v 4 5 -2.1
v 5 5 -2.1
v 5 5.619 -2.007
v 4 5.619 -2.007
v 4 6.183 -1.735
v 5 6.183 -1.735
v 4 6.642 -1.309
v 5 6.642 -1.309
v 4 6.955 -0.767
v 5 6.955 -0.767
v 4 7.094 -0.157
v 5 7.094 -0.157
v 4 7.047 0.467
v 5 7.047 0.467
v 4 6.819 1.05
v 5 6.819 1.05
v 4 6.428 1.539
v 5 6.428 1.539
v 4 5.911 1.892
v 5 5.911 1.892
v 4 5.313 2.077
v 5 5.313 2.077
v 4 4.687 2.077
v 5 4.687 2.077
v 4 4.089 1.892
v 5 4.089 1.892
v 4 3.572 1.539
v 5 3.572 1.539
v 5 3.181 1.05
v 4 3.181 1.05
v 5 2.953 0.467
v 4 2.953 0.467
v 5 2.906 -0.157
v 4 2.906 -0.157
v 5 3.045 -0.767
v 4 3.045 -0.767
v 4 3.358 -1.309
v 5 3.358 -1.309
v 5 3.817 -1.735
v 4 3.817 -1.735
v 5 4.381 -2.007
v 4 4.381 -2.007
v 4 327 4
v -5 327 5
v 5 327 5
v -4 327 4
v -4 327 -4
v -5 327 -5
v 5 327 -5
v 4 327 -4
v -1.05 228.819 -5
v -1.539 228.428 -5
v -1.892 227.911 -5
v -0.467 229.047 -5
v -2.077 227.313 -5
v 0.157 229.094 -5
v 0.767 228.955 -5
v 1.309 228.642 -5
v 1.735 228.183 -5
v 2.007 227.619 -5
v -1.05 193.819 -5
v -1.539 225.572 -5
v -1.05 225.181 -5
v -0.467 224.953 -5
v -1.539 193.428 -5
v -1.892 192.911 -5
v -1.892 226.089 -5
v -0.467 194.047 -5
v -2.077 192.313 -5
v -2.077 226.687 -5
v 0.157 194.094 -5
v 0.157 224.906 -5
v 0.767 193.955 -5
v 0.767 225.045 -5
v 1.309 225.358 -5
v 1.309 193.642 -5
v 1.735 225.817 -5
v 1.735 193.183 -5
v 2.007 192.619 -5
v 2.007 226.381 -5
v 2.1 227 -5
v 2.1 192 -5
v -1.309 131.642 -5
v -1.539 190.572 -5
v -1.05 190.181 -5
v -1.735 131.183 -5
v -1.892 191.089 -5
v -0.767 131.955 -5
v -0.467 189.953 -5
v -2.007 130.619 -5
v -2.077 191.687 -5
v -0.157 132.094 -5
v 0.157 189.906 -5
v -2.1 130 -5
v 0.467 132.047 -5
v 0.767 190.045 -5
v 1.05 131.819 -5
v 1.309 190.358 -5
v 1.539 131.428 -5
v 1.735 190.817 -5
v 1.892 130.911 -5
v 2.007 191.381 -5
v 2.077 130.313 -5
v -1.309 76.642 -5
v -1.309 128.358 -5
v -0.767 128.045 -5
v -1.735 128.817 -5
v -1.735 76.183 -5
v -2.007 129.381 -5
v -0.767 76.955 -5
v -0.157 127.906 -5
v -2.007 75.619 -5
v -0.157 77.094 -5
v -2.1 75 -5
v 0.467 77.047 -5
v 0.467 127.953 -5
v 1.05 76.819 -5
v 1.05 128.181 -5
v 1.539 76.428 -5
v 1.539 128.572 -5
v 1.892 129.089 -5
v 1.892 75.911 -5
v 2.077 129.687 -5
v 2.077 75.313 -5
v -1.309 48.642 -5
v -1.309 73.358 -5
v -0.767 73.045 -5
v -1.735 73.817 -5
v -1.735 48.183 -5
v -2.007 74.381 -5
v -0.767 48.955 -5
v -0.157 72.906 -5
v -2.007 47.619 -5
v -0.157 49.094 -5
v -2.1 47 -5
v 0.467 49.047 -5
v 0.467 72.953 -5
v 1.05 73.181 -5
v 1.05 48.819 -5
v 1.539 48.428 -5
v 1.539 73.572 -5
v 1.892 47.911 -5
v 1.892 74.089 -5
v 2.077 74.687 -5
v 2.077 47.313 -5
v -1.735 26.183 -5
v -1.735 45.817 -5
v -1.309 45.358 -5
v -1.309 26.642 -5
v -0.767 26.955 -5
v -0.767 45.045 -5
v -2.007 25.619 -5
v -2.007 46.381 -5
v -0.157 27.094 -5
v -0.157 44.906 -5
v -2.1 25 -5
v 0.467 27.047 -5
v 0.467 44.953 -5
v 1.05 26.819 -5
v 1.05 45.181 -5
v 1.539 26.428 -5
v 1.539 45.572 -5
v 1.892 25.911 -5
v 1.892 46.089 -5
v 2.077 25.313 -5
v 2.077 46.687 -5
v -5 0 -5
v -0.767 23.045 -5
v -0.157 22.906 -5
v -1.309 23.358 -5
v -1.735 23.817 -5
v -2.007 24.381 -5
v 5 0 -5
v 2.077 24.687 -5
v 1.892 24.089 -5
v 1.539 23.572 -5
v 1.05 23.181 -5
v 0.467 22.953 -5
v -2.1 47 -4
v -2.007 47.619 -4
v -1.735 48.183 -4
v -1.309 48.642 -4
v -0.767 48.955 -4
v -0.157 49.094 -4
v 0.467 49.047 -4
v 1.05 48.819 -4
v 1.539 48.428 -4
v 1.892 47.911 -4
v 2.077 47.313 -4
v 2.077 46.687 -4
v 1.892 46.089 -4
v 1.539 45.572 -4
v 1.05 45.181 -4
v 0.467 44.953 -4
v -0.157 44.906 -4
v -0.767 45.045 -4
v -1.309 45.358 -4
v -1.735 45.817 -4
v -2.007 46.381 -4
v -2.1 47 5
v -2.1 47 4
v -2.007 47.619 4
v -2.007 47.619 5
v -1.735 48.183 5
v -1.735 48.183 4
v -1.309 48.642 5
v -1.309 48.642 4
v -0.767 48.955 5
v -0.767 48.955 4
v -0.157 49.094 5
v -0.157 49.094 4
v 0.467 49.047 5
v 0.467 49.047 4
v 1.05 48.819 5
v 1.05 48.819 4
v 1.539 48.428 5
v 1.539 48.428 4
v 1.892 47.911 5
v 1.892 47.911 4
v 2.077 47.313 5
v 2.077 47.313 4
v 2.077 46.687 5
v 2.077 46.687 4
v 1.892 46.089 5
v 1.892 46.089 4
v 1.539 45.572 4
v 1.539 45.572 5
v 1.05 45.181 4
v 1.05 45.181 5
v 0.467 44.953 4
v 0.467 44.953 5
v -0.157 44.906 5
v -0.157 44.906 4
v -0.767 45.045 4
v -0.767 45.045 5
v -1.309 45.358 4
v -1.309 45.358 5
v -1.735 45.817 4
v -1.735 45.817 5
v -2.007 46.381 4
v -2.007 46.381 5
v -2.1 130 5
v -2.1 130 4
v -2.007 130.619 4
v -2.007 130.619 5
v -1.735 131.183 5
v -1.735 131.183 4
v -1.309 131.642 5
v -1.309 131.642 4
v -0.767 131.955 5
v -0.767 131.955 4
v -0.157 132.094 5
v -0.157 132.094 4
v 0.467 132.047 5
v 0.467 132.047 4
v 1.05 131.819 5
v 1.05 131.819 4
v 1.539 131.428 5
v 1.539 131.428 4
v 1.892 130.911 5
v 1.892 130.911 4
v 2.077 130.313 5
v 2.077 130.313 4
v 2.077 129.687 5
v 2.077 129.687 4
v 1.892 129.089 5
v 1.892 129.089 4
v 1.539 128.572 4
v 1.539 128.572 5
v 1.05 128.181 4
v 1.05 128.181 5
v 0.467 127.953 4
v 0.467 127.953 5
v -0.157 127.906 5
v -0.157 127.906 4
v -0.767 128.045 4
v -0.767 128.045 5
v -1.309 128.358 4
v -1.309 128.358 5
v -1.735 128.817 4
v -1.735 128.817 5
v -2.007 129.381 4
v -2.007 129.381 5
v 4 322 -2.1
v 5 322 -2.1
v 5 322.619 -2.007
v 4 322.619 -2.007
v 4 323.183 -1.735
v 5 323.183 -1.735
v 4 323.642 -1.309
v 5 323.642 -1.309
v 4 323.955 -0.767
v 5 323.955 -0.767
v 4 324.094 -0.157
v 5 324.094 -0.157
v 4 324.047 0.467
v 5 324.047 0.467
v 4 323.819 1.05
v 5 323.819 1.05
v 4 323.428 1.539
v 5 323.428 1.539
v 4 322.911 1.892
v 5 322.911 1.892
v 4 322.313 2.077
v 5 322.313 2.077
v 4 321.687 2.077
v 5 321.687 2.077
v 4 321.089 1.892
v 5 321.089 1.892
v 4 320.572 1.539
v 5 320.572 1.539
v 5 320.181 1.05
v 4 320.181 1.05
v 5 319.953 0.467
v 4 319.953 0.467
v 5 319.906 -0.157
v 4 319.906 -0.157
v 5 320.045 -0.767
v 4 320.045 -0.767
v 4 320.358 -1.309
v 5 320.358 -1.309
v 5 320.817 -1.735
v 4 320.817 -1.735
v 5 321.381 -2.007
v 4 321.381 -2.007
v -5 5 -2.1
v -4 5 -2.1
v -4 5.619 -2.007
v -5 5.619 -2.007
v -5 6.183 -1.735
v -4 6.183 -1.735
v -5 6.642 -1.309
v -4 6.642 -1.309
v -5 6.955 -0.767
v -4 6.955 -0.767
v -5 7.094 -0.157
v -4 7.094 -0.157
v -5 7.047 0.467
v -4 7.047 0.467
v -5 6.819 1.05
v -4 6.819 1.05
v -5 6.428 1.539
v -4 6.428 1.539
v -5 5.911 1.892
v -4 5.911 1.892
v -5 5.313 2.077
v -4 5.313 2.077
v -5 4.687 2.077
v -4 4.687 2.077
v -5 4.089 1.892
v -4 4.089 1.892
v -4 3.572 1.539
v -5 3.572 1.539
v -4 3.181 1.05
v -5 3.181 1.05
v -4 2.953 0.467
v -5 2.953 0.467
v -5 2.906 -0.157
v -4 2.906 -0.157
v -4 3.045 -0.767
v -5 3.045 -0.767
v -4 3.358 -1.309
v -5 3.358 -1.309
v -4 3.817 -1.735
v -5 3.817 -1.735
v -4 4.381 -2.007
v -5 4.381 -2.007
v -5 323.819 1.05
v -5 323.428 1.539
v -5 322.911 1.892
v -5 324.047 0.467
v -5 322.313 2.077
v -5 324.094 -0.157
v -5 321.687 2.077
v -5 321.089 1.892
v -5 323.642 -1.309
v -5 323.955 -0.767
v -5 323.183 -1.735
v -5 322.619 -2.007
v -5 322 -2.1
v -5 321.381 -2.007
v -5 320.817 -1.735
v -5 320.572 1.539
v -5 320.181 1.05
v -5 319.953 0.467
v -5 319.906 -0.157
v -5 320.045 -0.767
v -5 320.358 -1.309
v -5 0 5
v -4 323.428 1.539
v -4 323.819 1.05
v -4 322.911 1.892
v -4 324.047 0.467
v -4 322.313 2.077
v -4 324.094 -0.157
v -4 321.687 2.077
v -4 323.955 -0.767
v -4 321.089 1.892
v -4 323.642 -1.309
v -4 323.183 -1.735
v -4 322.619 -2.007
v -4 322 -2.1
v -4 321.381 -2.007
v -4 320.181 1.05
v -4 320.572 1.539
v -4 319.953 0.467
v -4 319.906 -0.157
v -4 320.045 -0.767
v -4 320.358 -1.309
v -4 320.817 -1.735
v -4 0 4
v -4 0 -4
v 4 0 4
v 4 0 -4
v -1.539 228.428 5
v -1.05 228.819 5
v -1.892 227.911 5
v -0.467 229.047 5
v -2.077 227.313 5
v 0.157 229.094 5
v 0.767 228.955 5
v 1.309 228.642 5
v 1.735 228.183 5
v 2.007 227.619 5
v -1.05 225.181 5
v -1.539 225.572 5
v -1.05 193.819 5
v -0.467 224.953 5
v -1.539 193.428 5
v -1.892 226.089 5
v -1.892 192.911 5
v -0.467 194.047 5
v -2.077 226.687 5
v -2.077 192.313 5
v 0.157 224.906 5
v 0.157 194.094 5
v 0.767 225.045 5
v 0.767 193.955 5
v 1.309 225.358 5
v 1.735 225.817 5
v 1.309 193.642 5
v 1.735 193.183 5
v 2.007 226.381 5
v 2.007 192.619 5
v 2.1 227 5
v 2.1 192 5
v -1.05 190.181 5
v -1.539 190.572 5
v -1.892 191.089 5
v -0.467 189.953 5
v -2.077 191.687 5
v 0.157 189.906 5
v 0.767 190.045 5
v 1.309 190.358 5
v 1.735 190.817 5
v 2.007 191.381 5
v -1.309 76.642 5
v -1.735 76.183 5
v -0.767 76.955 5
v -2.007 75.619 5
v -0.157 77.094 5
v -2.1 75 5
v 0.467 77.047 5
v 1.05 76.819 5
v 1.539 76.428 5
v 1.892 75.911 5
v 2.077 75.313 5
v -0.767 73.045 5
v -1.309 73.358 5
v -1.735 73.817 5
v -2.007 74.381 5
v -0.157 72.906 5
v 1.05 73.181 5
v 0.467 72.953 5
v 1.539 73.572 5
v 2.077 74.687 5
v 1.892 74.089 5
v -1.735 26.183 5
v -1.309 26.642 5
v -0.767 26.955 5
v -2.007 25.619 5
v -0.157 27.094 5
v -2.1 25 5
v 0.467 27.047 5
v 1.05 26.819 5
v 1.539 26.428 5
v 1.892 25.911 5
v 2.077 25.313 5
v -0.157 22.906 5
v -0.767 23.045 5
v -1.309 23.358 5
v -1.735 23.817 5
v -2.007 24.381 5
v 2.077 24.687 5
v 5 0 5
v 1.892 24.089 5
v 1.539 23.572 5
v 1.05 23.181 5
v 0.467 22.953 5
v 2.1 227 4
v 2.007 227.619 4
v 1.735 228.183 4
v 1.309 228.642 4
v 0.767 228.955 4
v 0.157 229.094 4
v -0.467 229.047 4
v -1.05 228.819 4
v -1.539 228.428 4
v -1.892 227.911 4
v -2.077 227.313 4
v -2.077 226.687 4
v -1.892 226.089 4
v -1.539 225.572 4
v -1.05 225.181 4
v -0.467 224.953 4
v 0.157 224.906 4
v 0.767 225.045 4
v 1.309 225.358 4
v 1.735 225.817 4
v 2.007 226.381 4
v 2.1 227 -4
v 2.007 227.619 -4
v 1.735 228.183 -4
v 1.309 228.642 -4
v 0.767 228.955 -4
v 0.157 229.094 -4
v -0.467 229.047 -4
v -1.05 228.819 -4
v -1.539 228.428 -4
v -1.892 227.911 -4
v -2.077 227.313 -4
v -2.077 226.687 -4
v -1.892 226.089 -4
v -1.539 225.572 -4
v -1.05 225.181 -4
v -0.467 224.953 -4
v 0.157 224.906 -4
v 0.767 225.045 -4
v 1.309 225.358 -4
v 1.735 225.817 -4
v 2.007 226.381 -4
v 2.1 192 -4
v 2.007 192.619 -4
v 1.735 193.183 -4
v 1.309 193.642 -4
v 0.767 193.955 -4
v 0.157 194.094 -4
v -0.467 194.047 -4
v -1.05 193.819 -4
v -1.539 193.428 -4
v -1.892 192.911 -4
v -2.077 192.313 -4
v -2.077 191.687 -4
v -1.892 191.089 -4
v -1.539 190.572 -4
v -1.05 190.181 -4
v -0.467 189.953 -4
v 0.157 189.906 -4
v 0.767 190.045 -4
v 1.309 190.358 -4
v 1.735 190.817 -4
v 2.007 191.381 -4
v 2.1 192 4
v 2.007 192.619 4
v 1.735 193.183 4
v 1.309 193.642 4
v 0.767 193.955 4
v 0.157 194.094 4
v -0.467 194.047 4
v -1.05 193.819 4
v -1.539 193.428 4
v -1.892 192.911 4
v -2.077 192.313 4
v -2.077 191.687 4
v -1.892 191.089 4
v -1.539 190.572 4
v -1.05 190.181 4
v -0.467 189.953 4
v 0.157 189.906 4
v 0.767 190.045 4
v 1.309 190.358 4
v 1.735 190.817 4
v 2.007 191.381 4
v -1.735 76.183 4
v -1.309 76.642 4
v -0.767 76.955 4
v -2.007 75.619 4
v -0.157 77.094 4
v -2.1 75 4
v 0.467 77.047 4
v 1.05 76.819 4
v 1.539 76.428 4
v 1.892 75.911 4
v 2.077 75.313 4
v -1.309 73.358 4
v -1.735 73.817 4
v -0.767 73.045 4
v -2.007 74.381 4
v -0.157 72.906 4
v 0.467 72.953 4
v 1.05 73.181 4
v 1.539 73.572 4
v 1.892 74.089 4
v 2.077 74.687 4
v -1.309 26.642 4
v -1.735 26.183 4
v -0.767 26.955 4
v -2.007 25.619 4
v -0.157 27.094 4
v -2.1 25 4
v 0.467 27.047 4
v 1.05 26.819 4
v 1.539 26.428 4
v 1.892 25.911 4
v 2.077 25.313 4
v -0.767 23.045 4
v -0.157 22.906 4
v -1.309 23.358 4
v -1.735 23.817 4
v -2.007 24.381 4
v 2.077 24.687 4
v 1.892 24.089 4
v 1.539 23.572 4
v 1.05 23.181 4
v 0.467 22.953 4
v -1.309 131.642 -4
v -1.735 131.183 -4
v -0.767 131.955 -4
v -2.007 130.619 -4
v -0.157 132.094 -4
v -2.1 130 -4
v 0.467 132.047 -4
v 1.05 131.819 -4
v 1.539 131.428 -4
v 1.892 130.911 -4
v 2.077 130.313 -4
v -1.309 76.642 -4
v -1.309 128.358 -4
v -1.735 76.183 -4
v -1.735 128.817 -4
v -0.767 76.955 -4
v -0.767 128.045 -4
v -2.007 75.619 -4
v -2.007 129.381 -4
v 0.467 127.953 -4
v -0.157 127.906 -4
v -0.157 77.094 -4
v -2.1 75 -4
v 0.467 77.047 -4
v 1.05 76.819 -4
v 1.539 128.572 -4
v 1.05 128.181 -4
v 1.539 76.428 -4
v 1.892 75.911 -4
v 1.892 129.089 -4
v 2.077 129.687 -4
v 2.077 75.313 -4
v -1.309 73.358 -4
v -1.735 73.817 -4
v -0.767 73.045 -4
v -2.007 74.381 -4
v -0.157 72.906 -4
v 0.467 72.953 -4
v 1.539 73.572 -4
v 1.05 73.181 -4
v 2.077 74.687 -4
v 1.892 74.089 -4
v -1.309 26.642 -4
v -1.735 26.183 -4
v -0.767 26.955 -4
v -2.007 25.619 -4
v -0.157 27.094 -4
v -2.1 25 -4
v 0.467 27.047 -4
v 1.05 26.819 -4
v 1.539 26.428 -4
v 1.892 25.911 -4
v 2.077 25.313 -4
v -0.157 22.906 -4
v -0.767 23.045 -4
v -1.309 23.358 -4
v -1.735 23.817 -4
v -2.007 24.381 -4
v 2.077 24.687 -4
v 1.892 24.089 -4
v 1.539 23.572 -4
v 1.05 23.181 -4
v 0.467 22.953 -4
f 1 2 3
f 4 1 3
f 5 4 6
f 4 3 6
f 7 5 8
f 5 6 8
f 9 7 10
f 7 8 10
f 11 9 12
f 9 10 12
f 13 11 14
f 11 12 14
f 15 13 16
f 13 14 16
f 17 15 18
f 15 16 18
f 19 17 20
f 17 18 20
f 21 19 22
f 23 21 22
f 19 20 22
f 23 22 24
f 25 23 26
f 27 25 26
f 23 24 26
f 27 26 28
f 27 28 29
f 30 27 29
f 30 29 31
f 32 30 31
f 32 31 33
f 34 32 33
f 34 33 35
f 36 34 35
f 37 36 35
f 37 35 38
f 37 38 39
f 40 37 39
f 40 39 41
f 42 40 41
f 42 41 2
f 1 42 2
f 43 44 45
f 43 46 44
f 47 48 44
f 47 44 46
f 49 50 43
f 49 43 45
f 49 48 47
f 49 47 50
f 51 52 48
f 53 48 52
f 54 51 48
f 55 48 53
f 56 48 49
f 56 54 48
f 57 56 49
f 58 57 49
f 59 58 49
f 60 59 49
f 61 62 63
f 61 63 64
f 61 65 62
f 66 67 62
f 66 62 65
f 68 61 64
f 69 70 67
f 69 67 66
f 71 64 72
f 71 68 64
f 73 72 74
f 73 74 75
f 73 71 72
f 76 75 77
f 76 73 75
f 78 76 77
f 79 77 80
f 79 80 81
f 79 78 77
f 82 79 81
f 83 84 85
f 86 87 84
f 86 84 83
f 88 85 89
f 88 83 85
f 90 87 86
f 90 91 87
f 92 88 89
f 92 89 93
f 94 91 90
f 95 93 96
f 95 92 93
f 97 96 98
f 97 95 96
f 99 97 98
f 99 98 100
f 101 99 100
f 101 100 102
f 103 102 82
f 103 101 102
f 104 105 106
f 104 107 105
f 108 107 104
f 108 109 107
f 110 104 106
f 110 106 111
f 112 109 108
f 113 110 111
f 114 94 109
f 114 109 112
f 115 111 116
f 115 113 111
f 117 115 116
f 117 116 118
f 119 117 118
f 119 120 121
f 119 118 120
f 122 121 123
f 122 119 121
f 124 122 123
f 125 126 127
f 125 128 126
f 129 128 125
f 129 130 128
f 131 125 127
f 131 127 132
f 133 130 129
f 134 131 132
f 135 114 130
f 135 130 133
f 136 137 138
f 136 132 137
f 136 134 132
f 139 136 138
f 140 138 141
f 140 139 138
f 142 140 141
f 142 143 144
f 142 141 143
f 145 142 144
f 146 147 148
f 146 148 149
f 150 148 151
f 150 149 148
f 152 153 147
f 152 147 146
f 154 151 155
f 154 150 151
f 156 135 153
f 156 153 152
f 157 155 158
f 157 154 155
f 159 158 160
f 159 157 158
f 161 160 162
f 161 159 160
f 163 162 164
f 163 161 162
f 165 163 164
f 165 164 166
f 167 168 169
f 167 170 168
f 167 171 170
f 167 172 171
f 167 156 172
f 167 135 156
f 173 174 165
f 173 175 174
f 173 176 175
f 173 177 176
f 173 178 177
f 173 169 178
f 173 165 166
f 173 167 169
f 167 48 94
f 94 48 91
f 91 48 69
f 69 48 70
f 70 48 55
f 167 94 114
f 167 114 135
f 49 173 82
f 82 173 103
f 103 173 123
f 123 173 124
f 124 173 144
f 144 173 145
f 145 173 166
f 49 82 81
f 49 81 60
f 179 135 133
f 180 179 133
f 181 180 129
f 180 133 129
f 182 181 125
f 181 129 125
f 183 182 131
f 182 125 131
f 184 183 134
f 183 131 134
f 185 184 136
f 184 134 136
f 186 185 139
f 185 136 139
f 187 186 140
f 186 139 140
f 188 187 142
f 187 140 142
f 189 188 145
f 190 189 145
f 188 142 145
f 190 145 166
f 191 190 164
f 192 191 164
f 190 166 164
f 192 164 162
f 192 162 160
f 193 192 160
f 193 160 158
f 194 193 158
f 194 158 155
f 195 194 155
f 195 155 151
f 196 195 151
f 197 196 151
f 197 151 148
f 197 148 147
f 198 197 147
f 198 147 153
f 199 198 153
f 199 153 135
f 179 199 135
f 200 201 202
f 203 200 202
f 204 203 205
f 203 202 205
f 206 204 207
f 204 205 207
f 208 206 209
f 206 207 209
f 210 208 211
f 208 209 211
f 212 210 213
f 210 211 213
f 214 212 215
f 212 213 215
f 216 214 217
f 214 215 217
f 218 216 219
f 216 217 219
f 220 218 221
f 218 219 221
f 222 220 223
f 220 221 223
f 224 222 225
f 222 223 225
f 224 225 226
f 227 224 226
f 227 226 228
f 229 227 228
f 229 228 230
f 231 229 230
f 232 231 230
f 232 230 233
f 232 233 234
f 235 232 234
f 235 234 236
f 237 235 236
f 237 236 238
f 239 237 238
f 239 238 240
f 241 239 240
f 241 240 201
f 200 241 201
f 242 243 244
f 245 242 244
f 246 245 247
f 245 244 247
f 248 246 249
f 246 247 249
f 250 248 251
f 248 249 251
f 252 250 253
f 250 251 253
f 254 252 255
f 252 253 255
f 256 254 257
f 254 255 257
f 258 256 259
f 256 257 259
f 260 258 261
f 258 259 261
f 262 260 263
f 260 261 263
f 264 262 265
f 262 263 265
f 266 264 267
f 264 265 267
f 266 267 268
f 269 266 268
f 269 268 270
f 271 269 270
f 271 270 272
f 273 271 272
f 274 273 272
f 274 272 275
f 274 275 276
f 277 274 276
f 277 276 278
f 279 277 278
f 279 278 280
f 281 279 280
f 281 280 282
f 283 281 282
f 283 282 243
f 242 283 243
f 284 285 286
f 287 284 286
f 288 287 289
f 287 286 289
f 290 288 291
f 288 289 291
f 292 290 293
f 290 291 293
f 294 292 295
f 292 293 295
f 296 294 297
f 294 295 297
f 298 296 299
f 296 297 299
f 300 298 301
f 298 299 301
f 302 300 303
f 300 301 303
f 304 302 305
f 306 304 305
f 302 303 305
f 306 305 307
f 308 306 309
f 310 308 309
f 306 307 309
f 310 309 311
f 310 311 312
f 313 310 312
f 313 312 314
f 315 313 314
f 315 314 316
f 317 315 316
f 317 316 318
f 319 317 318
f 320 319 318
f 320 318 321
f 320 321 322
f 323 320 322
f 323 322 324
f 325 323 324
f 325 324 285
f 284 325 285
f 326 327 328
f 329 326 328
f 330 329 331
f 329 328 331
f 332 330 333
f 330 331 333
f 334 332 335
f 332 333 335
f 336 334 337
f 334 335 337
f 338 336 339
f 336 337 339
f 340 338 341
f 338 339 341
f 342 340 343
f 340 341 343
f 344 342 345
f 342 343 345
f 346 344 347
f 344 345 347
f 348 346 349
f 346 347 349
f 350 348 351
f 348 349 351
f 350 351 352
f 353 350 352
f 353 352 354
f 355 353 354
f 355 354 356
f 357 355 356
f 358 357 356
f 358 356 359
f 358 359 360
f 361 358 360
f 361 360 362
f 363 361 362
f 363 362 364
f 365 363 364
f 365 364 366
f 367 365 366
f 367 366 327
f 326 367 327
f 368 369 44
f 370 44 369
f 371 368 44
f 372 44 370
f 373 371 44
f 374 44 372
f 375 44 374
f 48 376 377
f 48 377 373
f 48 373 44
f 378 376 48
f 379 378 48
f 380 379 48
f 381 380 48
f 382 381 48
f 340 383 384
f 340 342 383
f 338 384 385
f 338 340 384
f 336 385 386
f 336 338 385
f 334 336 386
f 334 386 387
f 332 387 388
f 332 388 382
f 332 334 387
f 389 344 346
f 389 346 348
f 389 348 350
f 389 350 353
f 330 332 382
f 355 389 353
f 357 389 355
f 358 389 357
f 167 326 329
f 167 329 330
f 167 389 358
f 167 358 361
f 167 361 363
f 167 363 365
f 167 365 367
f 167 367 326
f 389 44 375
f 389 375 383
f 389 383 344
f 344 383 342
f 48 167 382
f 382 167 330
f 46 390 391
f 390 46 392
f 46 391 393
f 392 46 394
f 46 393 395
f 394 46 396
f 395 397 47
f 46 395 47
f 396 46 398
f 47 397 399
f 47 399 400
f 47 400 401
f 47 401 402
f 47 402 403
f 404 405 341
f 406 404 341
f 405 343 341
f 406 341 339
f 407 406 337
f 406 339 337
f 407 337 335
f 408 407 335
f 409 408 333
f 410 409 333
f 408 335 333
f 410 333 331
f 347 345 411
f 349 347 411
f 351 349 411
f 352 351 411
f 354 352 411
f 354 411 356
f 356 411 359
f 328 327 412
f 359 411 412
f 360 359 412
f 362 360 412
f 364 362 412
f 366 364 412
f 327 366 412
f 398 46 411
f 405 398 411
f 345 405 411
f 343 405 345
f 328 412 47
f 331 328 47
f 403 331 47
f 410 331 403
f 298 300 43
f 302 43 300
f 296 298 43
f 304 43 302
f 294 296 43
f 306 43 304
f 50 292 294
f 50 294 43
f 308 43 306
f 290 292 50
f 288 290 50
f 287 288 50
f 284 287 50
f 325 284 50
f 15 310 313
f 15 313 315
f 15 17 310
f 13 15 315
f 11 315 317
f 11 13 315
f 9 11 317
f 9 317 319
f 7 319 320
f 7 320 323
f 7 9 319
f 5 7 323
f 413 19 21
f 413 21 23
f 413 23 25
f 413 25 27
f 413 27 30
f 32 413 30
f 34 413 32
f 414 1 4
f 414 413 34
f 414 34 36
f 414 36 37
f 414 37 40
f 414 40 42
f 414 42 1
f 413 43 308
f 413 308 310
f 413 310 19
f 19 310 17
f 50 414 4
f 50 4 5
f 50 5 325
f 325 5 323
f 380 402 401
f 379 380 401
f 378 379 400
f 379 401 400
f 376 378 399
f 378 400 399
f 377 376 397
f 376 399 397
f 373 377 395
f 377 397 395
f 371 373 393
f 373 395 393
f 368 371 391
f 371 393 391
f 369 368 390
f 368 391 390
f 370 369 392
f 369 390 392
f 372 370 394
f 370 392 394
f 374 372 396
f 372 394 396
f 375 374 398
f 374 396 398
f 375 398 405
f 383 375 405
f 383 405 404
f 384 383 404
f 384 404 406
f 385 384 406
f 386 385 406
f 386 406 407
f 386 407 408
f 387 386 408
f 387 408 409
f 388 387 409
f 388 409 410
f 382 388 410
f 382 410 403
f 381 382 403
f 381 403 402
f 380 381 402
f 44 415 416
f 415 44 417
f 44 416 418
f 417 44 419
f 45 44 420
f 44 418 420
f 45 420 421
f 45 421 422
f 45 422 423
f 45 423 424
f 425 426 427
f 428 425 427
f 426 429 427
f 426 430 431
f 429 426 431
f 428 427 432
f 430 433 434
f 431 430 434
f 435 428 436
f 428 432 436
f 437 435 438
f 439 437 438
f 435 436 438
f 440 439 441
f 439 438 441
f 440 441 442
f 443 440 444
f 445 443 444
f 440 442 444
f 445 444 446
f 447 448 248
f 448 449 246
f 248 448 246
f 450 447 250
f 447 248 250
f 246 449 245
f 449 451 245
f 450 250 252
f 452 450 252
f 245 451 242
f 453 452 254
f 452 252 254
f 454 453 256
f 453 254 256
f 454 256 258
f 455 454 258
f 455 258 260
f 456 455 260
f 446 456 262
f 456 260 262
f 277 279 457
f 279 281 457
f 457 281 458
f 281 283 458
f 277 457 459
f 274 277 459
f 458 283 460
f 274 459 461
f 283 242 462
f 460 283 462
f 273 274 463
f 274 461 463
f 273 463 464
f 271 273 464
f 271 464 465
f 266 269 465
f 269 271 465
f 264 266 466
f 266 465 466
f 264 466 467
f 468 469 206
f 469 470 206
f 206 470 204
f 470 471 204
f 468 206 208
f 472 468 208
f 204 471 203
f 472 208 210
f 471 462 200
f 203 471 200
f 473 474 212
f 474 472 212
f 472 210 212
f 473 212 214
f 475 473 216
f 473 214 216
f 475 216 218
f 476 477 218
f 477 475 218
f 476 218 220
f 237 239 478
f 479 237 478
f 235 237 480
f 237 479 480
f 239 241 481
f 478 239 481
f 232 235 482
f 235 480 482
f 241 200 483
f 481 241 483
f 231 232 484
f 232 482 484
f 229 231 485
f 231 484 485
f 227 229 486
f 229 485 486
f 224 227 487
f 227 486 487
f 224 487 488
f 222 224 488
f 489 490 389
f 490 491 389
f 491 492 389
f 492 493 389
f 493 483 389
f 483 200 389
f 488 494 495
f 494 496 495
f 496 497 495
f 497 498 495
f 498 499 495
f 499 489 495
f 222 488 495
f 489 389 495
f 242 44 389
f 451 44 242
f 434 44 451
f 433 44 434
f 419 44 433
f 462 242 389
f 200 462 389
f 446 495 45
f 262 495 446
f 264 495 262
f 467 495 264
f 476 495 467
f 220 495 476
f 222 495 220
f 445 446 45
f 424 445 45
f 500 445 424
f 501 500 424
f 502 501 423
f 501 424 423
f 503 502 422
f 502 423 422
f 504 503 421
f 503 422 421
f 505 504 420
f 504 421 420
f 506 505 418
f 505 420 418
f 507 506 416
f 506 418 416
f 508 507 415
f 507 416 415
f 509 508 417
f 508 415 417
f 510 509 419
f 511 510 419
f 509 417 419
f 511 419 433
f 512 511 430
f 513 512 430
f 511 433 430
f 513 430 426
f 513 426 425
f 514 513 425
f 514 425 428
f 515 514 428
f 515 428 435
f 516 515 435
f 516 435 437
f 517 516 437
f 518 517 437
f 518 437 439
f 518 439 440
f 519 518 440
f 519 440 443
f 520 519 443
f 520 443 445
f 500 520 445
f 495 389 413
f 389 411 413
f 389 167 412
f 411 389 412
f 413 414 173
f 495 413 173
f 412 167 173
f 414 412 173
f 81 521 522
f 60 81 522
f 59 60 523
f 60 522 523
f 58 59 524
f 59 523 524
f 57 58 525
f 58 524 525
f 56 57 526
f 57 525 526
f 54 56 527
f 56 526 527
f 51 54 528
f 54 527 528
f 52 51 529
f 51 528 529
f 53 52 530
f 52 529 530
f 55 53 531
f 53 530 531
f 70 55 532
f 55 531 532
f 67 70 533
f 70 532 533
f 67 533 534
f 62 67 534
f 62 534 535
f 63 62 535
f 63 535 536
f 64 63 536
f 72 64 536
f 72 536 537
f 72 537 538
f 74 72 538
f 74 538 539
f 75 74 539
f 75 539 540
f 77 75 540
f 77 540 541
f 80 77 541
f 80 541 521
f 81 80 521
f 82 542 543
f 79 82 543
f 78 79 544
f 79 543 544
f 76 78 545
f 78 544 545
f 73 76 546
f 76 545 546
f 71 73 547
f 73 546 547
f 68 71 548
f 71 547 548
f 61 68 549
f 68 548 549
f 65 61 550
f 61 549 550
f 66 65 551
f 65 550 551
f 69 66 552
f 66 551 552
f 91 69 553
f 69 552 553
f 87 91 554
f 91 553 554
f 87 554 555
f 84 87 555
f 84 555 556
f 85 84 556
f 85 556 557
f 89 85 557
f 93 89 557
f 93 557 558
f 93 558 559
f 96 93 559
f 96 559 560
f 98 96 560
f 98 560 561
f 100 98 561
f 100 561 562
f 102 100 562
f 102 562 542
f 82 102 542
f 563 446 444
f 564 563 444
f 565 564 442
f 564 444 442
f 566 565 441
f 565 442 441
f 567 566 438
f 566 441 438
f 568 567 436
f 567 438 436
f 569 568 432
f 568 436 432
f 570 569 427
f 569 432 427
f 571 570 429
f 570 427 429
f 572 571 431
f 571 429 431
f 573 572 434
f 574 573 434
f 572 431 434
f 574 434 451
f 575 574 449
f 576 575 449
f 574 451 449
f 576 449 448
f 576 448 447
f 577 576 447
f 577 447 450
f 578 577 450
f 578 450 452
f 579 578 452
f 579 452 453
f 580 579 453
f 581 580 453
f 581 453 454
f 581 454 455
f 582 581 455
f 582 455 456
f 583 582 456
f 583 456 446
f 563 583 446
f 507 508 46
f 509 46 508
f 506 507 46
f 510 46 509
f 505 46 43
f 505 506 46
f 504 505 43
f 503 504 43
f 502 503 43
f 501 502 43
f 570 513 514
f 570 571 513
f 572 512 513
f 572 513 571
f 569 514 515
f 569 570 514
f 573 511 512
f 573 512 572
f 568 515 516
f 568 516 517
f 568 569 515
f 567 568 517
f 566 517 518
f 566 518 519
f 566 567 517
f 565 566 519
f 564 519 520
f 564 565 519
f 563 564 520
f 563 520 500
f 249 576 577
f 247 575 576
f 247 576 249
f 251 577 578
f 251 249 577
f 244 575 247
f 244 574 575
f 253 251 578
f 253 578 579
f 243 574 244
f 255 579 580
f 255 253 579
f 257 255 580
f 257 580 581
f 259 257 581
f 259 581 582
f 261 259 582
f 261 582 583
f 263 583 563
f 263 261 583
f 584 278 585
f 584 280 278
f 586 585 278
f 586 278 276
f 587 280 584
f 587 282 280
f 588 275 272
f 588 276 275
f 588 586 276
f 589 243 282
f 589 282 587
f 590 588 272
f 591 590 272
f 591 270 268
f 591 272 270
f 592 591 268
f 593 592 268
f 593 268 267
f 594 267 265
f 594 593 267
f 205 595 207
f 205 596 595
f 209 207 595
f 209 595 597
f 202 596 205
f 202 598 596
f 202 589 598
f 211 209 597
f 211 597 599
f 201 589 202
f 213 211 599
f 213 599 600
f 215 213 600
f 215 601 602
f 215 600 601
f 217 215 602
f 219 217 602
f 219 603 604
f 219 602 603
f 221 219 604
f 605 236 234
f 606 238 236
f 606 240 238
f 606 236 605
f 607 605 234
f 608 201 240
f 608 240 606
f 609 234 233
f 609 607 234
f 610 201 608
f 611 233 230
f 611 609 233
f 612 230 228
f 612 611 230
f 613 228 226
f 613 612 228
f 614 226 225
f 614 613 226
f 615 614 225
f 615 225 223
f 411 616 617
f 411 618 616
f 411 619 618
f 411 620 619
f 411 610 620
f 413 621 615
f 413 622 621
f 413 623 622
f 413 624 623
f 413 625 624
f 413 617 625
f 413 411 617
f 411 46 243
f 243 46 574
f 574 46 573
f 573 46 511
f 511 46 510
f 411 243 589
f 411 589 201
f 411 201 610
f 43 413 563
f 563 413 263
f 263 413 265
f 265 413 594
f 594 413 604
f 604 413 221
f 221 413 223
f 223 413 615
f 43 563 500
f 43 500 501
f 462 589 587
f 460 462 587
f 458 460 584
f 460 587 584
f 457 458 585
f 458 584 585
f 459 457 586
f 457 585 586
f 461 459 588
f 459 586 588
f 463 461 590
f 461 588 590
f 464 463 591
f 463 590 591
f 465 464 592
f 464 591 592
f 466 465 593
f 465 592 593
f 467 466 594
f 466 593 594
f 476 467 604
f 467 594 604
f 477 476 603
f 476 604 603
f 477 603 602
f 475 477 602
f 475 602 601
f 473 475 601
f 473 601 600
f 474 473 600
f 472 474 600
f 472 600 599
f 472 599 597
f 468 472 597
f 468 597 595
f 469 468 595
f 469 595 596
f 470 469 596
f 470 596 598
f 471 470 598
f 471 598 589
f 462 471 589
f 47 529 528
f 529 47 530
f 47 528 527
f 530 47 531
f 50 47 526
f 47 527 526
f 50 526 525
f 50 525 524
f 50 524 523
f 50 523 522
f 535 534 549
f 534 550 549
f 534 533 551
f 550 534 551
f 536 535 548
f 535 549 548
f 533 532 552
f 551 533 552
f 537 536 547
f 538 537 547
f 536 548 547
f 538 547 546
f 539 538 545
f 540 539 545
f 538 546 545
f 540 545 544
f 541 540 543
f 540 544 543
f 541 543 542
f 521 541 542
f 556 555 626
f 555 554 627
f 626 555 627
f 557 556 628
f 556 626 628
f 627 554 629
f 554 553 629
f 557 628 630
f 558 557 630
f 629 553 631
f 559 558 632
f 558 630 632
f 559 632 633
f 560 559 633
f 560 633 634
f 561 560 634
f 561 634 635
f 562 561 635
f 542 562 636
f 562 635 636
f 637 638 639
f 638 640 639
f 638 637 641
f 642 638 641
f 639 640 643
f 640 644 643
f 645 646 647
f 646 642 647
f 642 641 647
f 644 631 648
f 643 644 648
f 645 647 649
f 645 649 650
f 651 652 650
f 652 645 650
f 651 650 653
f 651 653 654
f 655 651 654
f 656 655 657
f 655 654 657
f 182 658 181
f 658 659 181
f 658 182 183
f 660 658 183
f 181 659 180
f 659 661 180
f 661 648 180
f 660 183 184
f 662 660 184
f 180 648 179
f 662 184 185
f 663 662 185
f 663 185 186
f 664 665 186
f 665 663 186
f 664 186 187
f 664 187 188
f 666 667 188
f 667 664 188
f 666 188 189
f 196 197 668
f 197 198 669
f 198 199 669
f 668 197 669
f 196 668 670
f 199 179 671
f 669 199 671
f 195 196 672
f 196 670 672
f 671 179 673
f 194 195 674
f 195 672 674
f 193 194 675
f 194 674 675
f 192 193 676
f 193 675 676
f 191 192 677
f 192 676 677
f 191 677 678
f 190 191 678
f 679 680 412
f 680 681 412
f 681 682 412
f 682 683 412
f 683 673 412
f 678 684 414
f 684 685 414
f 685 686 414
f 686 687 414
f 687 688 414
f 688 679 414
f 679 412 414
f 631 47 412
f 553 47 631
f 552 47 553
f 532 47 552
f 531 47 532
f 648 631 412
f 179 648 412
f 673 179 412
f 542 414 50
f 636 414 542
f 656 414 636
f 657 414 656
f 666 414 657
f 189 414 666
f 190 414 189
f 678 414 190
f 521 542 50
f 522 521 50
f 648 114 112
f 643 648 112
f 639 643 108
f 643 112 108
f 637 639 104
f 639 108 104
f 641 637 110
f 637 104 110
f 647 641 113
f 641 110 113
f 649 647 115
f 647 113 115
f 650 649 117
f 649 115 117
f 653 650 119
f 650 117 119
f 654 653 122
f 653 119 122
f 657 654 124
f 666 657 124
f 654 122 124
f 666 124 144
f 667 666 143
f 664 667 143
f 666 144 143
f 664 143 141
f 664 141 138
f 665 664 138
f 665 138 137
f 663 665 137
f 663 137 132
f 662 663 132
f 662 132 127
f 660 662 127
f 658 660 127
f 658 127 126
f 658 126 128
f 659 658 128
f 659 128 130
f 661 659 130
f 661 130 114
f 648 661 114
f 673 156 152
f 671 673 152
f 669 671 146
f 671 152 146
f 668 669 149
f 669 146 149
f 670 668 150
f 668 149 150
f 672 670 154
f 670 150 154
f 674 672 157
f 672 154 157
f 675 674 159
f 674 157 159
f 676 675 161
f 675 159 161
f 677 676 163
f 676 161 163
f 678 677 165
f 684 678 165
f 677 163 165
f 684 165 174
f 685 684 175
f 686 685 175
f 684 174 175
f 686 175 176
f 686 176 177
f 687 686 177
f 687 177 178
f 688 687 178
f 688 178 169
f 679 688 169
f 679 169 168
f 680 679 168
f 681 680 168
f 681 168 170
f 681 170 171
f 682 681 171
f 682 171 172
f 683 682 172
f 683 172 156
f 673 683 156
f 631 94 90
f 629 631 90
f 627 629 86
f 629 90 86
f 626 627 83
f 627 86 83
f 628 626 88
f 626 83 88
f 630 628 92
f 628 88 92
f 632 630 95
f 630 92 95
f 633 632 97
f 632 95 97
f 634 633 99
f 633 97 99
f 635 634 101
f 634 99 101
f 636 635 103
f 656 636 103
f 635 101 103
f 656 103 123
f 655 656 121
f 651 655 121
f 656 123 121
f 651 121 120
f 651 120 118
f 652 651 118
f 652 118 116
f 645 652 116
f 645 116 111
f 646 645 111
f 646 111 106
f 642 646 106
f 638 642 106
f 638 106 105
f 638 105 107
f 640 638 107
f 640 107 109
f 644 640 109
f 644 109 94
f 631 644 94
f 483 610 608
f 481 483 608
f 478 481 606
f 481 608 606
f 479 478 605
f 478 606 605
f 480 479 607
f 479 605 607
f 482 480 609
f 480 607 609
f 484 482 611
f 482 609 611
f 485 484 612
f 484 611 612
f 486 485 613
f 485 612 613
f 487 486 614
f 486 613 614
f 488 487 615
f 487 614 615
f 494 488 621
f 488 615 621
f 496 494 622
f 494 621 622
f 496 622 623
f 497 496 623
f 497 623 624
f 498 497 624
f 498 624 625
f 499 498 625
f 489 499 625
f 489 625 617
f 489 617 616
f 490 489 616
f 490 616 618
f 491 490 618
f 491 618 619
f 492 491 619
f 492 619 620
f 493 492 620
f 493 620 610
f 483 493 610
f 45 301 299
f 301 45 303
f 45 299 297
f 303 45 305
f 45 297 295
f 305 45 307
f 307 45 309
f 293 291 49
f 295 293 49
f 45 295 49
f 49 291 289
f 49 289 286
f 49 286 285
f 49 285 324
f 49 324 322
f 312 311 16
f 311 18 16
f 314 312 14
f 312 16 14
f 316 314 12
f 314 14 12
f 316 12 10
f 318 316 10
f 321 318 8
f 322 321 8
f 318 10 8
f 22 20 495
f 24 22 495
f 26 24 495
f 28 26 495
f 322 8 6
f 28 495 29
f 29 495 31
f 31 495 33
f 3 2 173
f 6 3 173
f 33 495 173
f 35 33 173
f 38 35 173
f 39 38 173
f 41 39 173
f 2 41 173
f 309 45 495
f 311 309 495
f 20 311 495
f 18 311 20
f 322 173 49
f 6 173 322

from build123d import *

# Parameters (mm, degrees)
SKETCH_1_W          = 10
SKETCH_1_H          = 10
SKETCH_1_W_2        = 8
SKETCH_1_H_2        = 8
EXTRUDE_1_DEPTH     = 327
SKETCH_2_R          = 2.1
CUT_EXTRUDE_1_DEPTH = 328.191075673
SKETCH_3_R          = 2.1
CUT_EXTRUDE_2_DEPTH = 328.191075673
SKETCH_4_R          = 2.1
CUT_EXTRUDE_3_DEPTH = 328.191075673


with BuildPart() as part:
    # ｽｹｯﾁ1 → 押し出し-薄板1 (new body)
    with BuildSketch(Plane(origin=(0, 0, 0), x_dir=(1, 0, 0), z_dir=(0, 1, 0))):
        Rectangle(SKETCH_1_W, SKETCH_1_H)
        Rectangle(SKETCH_1_W_2, SKETCH_1_H_2, mode=Mode.SUBTRACT)
    extrude(amount=EXTRUDE_1_DEPTH)

    # ｽｹｯﾁ2 → ｶｯﾄ - 押し出し1 (cut, through all)
    with BuildSketch(Plane(origin=(5, 0, 0), x_dir=(0, 0, -1), z_dir=(1, 0, 0))):
        with Locations((0, 322)):
            Circle(SKETCH_2_R)
        with Locations((0, 5)):
            Circle(SKETCH_2_R)
    extrude(amount=-CUT_EXTRUDE_1_DEPTH, mode=Mode.SUBTRACT)

    # ｽｹｯﾁ3 → ｶｯﾄ - 押し出し2 (cut, through all)
    with BuildSketch(Plane(origin=(0, 0, -5), x_dir=(-1, 0, 0), z_dir=(0, 0, -1))):
        with Locations((0, 130)):
            Circle(SKETCH_3_R)
        with Locations((0, 75)):
            Circle(SKETCH_3_R)
        with Locations((0, 47)):
            Circle(SKETCH_3_R)
        with Locations((0, 25)):
            Circle(SKETCH_3_R)
    extrude(amount=-CUT_EXTRUDE_2_DEPTH, mode=Mode.SUBTRACT)

    # ｽｹｯﾁ4 → ｶｯﾄ - 押し出し3 (cut, through all)
    with BuildSketch(Plane.XY.offset(5)):
        with Locations((0, 192)):
            Circle(SKETCH_4_R)
        with Locations((0, 227)):
            Circle(SKETCH_4_R)
    extrude(amount=-CUT_EXTRUDE_3_DEPTH, mode=Mode.SUBTRACT)


solid = part.part
